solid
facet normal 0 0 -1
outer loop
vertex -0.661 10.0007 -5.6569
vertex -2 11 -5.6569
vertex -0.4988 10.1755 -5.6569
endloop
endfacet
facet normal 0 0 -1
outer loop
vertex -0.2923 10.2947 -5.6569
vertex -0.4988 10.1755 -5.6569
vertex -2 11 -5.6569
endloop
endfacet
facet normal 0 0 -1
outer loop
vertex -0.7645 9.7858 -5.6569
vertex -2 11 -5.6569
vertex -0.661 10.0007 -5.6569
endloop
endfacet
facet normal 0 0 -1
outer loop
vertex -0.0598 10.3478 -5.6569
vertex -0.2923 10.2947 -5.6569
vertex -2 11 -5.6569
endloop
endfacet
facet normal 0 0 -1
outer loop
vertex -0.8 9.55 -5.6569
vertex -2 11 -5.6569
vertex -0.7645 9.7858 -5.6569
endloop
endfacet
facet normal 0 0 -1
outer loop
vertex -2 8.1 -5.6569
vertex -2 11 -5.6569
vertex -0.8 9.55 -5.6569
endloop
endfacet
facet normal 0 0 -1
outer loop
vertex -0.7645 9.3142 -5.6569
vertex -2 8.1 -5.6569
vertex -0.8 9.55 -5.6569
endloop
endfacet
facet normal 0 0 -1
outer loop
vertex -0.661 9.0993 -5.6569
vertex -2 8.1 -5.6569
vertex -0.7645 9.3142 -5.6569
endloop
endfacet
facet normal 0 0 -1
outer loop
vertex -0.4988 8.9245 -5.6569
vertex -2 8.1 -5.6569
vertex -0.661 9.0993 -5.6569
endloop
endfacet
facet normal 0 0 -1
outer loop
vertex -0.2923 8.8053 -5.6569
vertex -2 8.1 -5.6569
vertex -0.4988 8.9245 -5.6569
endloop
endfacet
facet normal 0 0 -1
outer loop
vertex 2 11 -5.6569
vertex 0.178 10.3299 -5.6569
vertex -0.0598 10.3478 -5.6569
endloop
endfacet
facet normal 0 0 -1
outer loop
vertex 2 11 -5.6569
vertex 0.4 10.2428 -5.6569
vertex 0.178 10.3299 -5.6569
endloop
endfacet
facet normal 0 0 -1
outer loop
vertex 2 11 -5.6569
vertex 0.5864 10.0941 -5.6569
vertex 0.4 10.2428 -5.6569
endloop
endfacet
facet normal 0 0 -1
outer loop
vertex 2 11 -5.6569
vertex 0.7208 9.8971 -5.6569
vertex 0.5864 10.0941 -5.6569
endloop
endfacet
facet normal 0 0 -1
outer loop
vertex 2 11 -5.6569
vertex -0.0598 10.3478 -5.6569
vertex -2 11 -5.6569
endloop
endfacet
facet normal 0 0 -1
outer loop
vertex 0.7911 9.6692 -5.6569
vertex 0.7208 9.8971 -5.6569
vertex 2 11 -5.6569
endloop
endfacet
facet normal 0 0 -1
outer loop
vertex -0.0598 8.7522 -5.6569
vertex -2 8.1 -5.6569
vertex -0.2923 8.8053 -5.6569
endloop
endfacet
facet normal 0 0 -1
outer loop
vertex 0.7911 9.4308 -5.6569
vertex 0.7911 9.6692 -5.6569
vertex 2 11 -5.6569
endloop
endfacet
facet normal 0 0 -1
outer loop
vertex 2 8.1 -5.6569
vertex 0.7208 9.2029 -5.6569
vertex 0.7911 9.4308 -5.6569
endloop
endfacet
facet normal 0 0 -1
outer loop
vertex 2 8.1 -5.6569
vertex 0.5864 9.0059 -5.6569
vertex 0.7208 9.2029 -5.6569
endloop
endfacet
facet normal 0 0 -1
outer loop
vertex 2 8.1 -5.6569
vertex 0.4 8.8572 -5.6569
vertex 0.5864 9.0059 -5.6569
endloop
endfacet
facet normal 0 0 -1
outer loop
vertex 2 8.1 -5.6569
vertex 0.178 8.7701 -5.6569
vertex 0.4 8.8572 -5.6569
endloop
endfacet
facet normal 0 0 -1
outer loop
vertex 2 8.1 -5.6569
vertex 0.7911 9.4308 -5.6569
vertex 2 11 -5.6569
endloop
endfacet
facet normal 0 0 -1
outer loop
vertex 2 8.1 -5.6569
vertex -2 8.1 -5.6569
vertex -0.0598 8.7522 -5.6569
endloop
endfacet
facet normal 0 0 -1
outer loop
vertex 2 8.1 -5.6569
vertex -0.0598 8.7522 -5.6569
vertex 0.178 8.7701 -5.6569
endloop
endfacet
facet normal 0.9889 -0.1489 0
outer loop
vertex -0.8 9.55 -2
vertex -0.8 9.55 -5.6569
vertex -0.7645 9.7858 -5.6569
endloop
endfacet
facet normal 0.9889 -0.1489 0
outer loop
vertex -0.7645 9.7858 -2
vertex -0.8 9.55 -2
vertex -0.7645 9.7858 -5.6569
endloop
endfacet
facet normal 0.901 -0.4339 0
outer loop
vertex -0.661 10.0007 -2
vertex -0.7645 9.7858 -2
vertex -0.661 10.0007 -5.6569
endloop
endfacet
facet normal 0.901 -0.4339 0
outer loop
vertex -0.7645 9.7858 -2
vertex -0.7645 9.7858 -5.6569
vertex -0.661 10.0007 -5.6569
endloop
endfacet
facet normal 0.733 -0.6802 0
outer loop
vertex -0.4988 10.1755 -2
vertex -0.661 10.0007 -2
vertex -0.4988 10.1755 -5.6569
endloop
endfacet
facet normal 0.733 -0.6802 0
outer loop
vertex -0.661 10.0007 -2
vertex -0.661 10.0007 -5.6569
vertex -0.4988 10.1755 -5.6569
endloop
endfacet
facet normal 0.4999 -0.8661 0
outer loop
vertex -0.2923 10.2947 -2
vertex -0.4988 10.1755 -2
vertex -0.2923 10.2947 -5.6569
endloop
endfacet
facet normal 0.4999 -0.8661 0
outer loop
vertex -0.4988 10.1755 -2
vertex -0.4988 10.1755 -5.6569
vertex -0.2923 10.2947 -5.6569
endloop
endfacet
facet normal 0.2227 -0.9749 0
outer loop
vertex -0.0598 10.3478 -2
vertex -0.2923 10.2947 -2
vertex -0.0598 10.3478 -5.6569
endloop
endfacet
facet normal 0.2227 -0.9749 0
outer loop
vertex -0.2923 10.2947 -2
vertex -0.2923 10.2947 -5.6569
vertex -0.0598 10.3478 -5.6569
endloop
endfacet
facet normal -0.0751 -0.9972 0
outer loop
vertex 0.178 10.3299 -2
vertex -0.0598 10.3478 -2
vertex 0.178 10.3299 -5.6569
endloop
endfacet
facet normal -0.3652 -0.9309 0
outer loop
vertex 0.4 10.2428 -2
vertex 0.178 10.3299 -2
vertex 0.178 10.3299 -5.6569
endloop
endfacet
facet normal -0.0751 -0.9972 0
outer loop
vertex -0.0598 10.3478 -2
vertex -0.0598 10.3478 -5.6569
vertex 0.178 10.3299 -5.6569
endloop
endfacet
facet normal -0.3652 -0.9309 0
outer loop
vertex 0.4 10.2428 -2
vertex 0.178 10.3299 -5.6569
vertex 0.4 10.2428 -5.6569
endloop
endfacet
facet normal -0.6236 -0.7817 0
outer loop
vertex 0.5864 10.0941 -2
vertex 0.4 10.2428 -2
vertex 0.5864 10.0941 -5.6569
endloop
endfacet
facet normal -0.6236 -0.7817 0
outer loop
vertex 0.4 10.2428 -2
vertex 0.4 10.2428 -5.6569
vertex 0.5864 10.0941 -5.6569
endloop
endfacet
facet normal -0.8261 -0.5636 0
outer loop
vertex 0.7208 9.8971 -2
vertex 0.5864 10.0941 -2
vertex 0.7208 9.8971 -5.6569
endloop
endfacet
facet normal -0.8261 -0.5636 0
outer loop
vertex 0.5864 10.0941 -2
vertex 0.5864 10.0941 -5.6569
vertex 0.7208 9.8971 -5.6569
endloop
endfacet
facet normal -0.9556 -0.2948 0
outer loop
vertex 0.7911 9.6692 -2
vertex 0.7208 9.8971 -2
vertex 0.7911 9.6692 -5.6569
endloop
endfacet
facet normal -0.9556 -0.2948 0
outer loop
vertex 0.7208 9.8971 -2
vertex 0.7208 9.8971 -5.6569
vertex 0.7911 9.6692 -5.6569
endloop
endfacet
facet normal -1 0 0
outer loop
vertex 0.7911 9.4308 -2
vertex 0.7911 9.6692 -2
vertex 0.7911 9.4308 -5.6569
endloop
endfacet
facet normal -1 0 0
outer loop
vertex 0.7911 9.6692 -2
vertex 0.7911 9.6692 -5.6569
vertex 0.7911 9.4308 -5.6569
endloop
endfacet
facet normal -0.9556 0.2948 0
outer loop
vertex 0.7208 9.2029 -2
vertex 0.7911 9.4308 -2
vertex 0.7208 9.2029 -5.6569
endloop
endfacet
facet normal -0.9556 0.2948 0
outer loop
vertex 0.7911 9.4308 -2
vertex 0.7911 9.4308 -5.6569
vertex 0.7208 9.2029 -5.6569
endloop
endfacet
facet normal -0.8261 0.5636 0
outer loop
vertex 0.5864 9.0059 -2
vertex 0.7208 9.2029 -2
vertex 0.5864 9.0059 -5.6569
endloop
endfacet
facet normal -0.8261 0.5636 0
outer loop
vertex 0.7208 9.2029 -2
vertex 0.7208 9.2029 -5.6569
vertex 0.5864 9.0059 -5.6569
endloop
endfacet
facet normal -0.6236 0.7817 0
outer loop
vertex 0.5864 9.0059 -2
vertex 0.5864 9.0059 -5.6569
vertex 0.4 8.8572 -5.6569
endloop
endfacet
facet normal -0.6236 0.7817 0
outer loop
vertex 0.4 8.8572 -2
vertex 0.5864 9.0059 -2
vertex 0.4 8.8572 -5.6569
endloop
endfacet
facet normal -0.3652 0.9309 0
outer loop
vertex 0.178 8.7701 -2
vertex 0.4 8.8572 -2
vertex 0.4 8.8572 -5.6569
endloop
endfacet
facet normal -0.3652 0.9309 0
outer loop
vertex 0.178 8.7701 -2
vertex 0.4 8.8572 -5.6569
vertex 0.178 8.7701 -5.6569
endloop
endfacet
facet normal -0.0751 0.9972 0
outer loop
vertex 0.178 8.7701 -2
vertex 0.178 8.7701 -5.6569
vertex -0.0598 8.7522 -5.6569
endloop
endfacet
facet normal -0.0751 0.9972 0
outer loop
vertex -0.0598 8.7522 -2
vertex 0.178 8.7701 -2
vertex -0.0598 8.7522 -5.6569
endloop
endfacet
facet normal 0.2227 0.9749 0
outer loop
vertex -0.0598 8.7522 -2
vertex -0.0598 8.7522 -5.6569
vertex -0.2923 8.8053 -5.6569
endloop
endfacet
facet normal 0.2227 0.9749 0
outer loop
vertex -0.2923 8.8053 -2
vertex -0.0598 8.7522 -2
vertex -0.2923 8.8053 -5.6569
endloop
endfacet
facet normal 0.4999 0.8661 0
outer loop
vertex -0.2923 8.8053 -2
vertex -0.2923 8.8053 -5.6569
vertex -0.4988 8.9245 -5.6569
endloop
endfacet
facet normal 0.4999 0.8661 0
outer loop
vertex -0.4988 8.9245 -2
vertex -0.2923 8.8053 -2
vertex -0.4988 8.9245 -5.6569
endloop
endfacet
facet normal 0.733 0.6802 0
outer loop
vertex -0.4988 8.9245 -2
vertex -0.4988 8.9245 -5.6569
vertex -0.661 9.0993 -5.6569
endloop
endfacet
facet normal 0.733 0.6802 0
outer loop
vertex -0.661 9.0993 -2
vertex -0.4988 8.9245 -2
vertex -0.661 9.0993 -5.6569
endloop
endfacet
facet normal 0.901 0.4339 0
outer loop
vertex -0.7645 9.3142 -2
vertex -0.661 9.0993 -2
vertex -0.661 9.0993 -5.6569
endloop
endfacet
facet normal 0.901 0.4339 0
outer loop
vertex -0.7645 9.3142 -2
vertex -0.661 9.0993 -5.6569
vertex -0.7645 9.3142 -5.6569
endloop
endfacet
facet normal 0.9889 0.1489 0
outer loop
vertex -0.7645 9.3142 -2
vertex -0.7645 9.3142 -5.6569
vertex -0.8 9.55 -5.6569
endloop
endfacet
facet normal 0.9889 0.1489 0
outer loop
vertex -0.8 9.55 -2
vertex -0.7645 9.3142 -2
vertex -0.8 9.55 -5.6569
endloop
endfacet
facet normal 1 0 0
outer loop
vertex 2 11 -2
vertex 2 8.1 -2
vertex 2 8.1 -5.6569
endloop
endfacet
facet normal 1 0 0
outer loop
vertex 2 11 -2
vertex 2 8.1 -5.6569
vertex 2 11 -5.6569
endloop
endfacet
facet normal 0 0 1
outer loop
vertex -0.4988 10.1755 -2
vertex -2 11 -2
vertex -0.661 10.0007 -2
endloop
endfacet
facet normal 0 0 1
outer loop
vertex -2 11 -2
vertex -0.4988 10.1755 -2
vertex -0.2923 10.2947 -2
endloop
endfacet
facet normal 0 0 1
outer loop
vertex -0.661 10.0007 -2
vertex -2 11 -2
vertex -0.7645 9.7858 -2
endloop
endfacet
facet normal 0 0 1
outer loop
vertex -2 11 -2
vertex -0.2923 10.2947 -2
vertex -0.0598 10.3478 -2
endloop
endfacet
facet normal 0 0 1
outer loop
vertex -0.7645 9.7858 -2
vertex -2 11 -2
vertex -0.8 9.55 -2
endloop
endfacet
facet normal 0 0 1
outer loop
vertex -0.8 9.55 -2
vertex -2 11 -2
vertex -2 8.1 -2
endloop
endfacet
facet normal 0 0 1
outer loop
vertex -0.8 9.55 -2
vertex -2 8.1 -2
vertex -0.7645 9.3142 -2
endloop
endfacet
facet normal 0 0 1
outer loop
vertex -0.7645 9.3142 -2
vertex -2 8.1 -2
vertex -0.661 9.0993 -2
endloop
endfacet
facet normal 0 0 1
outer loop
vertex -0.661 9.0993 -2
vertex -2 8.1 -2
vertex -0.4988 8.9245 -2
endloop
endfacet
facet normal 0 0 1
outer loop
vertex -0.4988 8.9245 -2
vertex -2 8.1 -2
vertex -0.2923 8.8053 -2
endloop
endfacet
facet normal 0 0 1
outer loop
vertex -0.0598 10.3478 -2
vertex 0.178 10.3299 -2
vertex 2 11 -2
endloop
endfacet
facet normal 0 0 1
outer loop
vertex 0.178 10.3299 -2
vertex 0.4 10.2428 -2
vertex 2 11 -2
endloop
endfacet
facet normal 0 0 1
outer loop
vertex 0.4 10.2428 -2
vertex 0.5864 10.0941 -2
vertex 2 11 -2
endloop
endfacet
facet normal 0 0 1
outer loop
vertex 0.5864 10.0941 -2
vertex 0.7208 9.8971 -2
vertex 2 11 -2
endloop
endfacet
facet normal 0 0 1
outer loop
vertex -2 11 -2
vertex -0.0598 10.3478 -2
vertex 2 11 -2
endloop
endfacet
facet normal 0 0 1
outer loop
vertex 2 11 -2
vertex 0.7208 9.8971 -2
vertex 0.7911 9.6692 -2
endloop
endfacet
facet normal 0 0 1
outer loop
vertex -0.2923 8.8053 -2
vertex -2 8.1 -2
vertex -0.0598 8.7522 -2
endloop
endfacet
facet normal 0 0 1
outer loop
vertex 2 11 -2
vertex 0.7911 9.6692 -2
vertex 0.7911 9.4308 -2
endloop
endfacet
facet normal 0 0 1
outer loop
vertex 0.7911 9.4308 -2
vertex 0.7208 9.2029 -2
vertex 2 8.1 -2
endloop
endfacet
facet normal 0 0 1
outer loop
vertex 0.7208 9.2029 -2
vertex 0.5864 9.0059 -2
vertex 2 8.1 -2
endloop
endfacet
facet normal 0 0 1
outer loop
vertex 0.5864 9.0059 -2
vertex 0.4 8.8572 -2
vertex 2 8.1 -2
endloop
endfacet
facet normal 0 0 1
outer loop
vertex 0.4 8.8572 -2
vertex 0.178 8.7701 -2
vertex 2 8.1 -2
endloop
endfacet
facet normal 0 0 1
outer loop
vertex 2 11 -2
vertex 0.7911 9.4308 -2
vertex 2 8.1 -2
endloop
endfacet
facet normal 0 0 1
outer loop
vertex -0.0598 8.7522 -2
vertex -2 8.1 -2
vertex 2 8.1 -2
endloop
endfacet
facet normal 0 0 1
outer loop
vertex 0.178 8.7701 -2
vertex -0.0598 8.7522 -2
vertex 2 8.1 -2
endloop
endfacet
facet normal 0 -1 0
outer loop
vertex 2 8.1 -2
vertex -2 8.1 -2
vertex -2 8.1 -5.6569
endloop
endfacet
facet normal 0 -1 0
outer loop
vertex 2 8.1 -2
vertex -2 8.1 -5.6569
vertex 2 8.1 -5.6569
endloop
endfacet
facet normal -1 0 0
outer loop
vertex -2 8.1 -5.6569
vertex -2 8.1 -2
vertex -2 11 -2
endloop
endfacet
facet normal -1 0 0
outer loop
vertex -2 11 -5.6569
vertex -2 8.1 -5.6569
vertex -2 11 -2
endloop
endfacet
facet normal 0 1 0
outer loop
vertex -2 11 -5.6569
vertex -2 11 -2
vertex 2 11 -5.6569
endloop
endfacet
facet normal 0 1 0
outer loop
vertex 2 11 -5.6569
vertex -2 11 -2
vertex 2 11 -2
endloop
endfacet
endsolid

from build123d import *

# Parameters (mm, degrees)
SKETCH_1_R            = 15
EXTRUDE_1_DEPTH       = 5
HOLE_WIZARD_M3_1_D    = 2.5
SKETCH_4_R            = 6
EXTRUDE_2_DEPTH       = 10
SKETCH_5_R            = 2.5
CUT_EXTRUDE_1_DEPTH   = 26.980762114
FILLET_1_R            = 0.5
SKETCH_6_OUTSIDE_W    = 41
SKETCH_6_OUTSIDE_H    = 26
SKETCH_6_OUTSIDE_W_2  = 4
SKETCH_6_OUTSIDE_H_2  = 2.9
CUT_EXTRUDE_3_DEPTH   = 26.980762114
SKETCH_7_W            = 4
SKETCH_7_H            = 1.308251765
EXTRUDE_3_DEPTH       = 2.9
HOLE_WIZARD_M2_1_D    = 1.6
SKETCH_12_OUTSIDE_W   = 7.336
SKETCH_12_OUTSIDE_H   = 7.836
SKETCH_12_OUTSIDE_W_2 = 4
SKETCH_12_OUTSIDE_H_2 = 4.156854249
CUT_EXTRUDE_4_DEPTH   = 7.957729671
SKETCH_13_W           = 4
SKETCH_13_H           = 0.5
CUT_EXTRUDE_5_DEPTH   = 7.664082833


with BuildPart() as part:
    # 草图1 → 凸台-拉伸1 (new body)
    with BuildSketch(Plane(origin=(0, 0, 0), x_dir=(1, 0, 0), z_dir=(0, 1, 0))):
        with Locations(Location((0, 0, 0), (0, 0, 270))):
            Circle(SKETCH_1_R)
    extrude(amount=EXTRUDE_1_DEPTH)

    # M3 螺纹孔的螺纹孔钻头1 (through all)
    with Locations(Plane(origin=(0, 5, 0), x_dir=(1, 0, 0), z_dir=(0, 1, 0))):
        with Locations((12, 0), (0, 12), (0, -12), (-12, 0)):
            Hole(HOLE_WIZARD_M3_1_D / 2)

    # 草图4 → 凸台-拉伸2 (add)
    with BuildSketch(Plane(origin=(0, 5, 0), x_dir=(1, 0, 0), z_dir=(0, 1, 0))):
        with Locations(Location((0, 0, 0), (0, 0, 270))):
            Circle(SKETCH_4_R)
    extrude(amount=EXTRUDE_2_DEPTH)

    # 草图5 → 切除-拉伸1 (cut, through all)
    with BuildSketch(Plane(origin=(0, 15, 0), x_dir=(1, 0, 0), z_dir=(0, 1, 0))):
        with Locations(Location((0, 0, 0), (0, 0, 270))):
            Circle(SKETCH_5_R)
    extrude(amount=-CUT_EXTRUDE_1_DEPTH, mode=Mode.SUBTRACT)

    # 圆角1
    fillet_1_edges = [part.edges().sort_by_distance(p)[0] for p in [
        (0, 5, -6),
    ]]
    fillet(fillet_1_edges, radius=FILLET_1_R)

    # 草图6 outside → 切除-拉伸3 (cut, through all)
    with BuildSketch(Plane.XY):
        with Locations((0, 7.5)):
            Rectangle(SKETCH_6_OUTSIDE_W, SKETCH_6_OUTSIDE_H)
        with Locations((0, 9.55)):
            Rectangle(SKETCH_6_OUTSIDE_W_2, SKETCH_6_OUTSIDE_H_2, mode=Mode.SUBTRACT)
    extrude(amount=-CUT_EXTRUDE_3_DEPTH, mode=Mode.SUBTRACT)


with BuildPart() as body_2:
    # of the pieces the cut leaves, the one that is kept (cut_extrude_3_keep)
    add(part.part.solids().sort_by_distance((2, 8.1, -1.5))[0])

    # 草图7 → 凸台-拉伸3 (add, through all)
    with BuildSketch(Plane(origin=(0, 11, 0), x_dir=(1, 0, 0), z_dir=(0, 1, 0))):
        with Locations((0, 2.154125882)):
            Rectangle(SKETCH_7_W, SKETCH_7_H)
    extrude(amount=-EXTRUDE_3_DEPTH)

    # M2 螺纹孔的螺纹孔钻头1 (through all)
    with Locations(Plane.XY.offset(-1.5)):
        with Locations((0, 9.55)):
            Hole(HOLE_WIZARD_M2_1_D / 2)

    # 草图12 outside → 切除-拉伸4 (cut, through all)
    with BuildSketch(Plane.XZ.offset(-8.1)):
        with Locations((0, -3.75)):
            Rectangle(SKETCH_12_OUTSIDE_W, SKETCH_12_OUTSIDE_H)
        with Locations((0, -3.578427125)):
            Rectangle(SKETCH_12_OUTSIDE_W_2, SKETCH_12_OUTSIDE_H_2, mode=Mode.SUBTRACT)
    extrude(amount=-CUT_EXTRUDE_4_DEPTH, mode=Mode.SUBTRACT)

    # 草图13 → 切除-拉伸5 (cut, through all)
    with BuildSketch(Plane.XZ.offset(-8.1)):
        with Locations((0, -1.75)):
            Rectangle(SKETCH_13_W, SKETCH_13_H)
    extrude(amount=-CUT_EXTRUDE_5_DEPTH, mode=Mode.SUBTRACT)


solid = body_2.part
